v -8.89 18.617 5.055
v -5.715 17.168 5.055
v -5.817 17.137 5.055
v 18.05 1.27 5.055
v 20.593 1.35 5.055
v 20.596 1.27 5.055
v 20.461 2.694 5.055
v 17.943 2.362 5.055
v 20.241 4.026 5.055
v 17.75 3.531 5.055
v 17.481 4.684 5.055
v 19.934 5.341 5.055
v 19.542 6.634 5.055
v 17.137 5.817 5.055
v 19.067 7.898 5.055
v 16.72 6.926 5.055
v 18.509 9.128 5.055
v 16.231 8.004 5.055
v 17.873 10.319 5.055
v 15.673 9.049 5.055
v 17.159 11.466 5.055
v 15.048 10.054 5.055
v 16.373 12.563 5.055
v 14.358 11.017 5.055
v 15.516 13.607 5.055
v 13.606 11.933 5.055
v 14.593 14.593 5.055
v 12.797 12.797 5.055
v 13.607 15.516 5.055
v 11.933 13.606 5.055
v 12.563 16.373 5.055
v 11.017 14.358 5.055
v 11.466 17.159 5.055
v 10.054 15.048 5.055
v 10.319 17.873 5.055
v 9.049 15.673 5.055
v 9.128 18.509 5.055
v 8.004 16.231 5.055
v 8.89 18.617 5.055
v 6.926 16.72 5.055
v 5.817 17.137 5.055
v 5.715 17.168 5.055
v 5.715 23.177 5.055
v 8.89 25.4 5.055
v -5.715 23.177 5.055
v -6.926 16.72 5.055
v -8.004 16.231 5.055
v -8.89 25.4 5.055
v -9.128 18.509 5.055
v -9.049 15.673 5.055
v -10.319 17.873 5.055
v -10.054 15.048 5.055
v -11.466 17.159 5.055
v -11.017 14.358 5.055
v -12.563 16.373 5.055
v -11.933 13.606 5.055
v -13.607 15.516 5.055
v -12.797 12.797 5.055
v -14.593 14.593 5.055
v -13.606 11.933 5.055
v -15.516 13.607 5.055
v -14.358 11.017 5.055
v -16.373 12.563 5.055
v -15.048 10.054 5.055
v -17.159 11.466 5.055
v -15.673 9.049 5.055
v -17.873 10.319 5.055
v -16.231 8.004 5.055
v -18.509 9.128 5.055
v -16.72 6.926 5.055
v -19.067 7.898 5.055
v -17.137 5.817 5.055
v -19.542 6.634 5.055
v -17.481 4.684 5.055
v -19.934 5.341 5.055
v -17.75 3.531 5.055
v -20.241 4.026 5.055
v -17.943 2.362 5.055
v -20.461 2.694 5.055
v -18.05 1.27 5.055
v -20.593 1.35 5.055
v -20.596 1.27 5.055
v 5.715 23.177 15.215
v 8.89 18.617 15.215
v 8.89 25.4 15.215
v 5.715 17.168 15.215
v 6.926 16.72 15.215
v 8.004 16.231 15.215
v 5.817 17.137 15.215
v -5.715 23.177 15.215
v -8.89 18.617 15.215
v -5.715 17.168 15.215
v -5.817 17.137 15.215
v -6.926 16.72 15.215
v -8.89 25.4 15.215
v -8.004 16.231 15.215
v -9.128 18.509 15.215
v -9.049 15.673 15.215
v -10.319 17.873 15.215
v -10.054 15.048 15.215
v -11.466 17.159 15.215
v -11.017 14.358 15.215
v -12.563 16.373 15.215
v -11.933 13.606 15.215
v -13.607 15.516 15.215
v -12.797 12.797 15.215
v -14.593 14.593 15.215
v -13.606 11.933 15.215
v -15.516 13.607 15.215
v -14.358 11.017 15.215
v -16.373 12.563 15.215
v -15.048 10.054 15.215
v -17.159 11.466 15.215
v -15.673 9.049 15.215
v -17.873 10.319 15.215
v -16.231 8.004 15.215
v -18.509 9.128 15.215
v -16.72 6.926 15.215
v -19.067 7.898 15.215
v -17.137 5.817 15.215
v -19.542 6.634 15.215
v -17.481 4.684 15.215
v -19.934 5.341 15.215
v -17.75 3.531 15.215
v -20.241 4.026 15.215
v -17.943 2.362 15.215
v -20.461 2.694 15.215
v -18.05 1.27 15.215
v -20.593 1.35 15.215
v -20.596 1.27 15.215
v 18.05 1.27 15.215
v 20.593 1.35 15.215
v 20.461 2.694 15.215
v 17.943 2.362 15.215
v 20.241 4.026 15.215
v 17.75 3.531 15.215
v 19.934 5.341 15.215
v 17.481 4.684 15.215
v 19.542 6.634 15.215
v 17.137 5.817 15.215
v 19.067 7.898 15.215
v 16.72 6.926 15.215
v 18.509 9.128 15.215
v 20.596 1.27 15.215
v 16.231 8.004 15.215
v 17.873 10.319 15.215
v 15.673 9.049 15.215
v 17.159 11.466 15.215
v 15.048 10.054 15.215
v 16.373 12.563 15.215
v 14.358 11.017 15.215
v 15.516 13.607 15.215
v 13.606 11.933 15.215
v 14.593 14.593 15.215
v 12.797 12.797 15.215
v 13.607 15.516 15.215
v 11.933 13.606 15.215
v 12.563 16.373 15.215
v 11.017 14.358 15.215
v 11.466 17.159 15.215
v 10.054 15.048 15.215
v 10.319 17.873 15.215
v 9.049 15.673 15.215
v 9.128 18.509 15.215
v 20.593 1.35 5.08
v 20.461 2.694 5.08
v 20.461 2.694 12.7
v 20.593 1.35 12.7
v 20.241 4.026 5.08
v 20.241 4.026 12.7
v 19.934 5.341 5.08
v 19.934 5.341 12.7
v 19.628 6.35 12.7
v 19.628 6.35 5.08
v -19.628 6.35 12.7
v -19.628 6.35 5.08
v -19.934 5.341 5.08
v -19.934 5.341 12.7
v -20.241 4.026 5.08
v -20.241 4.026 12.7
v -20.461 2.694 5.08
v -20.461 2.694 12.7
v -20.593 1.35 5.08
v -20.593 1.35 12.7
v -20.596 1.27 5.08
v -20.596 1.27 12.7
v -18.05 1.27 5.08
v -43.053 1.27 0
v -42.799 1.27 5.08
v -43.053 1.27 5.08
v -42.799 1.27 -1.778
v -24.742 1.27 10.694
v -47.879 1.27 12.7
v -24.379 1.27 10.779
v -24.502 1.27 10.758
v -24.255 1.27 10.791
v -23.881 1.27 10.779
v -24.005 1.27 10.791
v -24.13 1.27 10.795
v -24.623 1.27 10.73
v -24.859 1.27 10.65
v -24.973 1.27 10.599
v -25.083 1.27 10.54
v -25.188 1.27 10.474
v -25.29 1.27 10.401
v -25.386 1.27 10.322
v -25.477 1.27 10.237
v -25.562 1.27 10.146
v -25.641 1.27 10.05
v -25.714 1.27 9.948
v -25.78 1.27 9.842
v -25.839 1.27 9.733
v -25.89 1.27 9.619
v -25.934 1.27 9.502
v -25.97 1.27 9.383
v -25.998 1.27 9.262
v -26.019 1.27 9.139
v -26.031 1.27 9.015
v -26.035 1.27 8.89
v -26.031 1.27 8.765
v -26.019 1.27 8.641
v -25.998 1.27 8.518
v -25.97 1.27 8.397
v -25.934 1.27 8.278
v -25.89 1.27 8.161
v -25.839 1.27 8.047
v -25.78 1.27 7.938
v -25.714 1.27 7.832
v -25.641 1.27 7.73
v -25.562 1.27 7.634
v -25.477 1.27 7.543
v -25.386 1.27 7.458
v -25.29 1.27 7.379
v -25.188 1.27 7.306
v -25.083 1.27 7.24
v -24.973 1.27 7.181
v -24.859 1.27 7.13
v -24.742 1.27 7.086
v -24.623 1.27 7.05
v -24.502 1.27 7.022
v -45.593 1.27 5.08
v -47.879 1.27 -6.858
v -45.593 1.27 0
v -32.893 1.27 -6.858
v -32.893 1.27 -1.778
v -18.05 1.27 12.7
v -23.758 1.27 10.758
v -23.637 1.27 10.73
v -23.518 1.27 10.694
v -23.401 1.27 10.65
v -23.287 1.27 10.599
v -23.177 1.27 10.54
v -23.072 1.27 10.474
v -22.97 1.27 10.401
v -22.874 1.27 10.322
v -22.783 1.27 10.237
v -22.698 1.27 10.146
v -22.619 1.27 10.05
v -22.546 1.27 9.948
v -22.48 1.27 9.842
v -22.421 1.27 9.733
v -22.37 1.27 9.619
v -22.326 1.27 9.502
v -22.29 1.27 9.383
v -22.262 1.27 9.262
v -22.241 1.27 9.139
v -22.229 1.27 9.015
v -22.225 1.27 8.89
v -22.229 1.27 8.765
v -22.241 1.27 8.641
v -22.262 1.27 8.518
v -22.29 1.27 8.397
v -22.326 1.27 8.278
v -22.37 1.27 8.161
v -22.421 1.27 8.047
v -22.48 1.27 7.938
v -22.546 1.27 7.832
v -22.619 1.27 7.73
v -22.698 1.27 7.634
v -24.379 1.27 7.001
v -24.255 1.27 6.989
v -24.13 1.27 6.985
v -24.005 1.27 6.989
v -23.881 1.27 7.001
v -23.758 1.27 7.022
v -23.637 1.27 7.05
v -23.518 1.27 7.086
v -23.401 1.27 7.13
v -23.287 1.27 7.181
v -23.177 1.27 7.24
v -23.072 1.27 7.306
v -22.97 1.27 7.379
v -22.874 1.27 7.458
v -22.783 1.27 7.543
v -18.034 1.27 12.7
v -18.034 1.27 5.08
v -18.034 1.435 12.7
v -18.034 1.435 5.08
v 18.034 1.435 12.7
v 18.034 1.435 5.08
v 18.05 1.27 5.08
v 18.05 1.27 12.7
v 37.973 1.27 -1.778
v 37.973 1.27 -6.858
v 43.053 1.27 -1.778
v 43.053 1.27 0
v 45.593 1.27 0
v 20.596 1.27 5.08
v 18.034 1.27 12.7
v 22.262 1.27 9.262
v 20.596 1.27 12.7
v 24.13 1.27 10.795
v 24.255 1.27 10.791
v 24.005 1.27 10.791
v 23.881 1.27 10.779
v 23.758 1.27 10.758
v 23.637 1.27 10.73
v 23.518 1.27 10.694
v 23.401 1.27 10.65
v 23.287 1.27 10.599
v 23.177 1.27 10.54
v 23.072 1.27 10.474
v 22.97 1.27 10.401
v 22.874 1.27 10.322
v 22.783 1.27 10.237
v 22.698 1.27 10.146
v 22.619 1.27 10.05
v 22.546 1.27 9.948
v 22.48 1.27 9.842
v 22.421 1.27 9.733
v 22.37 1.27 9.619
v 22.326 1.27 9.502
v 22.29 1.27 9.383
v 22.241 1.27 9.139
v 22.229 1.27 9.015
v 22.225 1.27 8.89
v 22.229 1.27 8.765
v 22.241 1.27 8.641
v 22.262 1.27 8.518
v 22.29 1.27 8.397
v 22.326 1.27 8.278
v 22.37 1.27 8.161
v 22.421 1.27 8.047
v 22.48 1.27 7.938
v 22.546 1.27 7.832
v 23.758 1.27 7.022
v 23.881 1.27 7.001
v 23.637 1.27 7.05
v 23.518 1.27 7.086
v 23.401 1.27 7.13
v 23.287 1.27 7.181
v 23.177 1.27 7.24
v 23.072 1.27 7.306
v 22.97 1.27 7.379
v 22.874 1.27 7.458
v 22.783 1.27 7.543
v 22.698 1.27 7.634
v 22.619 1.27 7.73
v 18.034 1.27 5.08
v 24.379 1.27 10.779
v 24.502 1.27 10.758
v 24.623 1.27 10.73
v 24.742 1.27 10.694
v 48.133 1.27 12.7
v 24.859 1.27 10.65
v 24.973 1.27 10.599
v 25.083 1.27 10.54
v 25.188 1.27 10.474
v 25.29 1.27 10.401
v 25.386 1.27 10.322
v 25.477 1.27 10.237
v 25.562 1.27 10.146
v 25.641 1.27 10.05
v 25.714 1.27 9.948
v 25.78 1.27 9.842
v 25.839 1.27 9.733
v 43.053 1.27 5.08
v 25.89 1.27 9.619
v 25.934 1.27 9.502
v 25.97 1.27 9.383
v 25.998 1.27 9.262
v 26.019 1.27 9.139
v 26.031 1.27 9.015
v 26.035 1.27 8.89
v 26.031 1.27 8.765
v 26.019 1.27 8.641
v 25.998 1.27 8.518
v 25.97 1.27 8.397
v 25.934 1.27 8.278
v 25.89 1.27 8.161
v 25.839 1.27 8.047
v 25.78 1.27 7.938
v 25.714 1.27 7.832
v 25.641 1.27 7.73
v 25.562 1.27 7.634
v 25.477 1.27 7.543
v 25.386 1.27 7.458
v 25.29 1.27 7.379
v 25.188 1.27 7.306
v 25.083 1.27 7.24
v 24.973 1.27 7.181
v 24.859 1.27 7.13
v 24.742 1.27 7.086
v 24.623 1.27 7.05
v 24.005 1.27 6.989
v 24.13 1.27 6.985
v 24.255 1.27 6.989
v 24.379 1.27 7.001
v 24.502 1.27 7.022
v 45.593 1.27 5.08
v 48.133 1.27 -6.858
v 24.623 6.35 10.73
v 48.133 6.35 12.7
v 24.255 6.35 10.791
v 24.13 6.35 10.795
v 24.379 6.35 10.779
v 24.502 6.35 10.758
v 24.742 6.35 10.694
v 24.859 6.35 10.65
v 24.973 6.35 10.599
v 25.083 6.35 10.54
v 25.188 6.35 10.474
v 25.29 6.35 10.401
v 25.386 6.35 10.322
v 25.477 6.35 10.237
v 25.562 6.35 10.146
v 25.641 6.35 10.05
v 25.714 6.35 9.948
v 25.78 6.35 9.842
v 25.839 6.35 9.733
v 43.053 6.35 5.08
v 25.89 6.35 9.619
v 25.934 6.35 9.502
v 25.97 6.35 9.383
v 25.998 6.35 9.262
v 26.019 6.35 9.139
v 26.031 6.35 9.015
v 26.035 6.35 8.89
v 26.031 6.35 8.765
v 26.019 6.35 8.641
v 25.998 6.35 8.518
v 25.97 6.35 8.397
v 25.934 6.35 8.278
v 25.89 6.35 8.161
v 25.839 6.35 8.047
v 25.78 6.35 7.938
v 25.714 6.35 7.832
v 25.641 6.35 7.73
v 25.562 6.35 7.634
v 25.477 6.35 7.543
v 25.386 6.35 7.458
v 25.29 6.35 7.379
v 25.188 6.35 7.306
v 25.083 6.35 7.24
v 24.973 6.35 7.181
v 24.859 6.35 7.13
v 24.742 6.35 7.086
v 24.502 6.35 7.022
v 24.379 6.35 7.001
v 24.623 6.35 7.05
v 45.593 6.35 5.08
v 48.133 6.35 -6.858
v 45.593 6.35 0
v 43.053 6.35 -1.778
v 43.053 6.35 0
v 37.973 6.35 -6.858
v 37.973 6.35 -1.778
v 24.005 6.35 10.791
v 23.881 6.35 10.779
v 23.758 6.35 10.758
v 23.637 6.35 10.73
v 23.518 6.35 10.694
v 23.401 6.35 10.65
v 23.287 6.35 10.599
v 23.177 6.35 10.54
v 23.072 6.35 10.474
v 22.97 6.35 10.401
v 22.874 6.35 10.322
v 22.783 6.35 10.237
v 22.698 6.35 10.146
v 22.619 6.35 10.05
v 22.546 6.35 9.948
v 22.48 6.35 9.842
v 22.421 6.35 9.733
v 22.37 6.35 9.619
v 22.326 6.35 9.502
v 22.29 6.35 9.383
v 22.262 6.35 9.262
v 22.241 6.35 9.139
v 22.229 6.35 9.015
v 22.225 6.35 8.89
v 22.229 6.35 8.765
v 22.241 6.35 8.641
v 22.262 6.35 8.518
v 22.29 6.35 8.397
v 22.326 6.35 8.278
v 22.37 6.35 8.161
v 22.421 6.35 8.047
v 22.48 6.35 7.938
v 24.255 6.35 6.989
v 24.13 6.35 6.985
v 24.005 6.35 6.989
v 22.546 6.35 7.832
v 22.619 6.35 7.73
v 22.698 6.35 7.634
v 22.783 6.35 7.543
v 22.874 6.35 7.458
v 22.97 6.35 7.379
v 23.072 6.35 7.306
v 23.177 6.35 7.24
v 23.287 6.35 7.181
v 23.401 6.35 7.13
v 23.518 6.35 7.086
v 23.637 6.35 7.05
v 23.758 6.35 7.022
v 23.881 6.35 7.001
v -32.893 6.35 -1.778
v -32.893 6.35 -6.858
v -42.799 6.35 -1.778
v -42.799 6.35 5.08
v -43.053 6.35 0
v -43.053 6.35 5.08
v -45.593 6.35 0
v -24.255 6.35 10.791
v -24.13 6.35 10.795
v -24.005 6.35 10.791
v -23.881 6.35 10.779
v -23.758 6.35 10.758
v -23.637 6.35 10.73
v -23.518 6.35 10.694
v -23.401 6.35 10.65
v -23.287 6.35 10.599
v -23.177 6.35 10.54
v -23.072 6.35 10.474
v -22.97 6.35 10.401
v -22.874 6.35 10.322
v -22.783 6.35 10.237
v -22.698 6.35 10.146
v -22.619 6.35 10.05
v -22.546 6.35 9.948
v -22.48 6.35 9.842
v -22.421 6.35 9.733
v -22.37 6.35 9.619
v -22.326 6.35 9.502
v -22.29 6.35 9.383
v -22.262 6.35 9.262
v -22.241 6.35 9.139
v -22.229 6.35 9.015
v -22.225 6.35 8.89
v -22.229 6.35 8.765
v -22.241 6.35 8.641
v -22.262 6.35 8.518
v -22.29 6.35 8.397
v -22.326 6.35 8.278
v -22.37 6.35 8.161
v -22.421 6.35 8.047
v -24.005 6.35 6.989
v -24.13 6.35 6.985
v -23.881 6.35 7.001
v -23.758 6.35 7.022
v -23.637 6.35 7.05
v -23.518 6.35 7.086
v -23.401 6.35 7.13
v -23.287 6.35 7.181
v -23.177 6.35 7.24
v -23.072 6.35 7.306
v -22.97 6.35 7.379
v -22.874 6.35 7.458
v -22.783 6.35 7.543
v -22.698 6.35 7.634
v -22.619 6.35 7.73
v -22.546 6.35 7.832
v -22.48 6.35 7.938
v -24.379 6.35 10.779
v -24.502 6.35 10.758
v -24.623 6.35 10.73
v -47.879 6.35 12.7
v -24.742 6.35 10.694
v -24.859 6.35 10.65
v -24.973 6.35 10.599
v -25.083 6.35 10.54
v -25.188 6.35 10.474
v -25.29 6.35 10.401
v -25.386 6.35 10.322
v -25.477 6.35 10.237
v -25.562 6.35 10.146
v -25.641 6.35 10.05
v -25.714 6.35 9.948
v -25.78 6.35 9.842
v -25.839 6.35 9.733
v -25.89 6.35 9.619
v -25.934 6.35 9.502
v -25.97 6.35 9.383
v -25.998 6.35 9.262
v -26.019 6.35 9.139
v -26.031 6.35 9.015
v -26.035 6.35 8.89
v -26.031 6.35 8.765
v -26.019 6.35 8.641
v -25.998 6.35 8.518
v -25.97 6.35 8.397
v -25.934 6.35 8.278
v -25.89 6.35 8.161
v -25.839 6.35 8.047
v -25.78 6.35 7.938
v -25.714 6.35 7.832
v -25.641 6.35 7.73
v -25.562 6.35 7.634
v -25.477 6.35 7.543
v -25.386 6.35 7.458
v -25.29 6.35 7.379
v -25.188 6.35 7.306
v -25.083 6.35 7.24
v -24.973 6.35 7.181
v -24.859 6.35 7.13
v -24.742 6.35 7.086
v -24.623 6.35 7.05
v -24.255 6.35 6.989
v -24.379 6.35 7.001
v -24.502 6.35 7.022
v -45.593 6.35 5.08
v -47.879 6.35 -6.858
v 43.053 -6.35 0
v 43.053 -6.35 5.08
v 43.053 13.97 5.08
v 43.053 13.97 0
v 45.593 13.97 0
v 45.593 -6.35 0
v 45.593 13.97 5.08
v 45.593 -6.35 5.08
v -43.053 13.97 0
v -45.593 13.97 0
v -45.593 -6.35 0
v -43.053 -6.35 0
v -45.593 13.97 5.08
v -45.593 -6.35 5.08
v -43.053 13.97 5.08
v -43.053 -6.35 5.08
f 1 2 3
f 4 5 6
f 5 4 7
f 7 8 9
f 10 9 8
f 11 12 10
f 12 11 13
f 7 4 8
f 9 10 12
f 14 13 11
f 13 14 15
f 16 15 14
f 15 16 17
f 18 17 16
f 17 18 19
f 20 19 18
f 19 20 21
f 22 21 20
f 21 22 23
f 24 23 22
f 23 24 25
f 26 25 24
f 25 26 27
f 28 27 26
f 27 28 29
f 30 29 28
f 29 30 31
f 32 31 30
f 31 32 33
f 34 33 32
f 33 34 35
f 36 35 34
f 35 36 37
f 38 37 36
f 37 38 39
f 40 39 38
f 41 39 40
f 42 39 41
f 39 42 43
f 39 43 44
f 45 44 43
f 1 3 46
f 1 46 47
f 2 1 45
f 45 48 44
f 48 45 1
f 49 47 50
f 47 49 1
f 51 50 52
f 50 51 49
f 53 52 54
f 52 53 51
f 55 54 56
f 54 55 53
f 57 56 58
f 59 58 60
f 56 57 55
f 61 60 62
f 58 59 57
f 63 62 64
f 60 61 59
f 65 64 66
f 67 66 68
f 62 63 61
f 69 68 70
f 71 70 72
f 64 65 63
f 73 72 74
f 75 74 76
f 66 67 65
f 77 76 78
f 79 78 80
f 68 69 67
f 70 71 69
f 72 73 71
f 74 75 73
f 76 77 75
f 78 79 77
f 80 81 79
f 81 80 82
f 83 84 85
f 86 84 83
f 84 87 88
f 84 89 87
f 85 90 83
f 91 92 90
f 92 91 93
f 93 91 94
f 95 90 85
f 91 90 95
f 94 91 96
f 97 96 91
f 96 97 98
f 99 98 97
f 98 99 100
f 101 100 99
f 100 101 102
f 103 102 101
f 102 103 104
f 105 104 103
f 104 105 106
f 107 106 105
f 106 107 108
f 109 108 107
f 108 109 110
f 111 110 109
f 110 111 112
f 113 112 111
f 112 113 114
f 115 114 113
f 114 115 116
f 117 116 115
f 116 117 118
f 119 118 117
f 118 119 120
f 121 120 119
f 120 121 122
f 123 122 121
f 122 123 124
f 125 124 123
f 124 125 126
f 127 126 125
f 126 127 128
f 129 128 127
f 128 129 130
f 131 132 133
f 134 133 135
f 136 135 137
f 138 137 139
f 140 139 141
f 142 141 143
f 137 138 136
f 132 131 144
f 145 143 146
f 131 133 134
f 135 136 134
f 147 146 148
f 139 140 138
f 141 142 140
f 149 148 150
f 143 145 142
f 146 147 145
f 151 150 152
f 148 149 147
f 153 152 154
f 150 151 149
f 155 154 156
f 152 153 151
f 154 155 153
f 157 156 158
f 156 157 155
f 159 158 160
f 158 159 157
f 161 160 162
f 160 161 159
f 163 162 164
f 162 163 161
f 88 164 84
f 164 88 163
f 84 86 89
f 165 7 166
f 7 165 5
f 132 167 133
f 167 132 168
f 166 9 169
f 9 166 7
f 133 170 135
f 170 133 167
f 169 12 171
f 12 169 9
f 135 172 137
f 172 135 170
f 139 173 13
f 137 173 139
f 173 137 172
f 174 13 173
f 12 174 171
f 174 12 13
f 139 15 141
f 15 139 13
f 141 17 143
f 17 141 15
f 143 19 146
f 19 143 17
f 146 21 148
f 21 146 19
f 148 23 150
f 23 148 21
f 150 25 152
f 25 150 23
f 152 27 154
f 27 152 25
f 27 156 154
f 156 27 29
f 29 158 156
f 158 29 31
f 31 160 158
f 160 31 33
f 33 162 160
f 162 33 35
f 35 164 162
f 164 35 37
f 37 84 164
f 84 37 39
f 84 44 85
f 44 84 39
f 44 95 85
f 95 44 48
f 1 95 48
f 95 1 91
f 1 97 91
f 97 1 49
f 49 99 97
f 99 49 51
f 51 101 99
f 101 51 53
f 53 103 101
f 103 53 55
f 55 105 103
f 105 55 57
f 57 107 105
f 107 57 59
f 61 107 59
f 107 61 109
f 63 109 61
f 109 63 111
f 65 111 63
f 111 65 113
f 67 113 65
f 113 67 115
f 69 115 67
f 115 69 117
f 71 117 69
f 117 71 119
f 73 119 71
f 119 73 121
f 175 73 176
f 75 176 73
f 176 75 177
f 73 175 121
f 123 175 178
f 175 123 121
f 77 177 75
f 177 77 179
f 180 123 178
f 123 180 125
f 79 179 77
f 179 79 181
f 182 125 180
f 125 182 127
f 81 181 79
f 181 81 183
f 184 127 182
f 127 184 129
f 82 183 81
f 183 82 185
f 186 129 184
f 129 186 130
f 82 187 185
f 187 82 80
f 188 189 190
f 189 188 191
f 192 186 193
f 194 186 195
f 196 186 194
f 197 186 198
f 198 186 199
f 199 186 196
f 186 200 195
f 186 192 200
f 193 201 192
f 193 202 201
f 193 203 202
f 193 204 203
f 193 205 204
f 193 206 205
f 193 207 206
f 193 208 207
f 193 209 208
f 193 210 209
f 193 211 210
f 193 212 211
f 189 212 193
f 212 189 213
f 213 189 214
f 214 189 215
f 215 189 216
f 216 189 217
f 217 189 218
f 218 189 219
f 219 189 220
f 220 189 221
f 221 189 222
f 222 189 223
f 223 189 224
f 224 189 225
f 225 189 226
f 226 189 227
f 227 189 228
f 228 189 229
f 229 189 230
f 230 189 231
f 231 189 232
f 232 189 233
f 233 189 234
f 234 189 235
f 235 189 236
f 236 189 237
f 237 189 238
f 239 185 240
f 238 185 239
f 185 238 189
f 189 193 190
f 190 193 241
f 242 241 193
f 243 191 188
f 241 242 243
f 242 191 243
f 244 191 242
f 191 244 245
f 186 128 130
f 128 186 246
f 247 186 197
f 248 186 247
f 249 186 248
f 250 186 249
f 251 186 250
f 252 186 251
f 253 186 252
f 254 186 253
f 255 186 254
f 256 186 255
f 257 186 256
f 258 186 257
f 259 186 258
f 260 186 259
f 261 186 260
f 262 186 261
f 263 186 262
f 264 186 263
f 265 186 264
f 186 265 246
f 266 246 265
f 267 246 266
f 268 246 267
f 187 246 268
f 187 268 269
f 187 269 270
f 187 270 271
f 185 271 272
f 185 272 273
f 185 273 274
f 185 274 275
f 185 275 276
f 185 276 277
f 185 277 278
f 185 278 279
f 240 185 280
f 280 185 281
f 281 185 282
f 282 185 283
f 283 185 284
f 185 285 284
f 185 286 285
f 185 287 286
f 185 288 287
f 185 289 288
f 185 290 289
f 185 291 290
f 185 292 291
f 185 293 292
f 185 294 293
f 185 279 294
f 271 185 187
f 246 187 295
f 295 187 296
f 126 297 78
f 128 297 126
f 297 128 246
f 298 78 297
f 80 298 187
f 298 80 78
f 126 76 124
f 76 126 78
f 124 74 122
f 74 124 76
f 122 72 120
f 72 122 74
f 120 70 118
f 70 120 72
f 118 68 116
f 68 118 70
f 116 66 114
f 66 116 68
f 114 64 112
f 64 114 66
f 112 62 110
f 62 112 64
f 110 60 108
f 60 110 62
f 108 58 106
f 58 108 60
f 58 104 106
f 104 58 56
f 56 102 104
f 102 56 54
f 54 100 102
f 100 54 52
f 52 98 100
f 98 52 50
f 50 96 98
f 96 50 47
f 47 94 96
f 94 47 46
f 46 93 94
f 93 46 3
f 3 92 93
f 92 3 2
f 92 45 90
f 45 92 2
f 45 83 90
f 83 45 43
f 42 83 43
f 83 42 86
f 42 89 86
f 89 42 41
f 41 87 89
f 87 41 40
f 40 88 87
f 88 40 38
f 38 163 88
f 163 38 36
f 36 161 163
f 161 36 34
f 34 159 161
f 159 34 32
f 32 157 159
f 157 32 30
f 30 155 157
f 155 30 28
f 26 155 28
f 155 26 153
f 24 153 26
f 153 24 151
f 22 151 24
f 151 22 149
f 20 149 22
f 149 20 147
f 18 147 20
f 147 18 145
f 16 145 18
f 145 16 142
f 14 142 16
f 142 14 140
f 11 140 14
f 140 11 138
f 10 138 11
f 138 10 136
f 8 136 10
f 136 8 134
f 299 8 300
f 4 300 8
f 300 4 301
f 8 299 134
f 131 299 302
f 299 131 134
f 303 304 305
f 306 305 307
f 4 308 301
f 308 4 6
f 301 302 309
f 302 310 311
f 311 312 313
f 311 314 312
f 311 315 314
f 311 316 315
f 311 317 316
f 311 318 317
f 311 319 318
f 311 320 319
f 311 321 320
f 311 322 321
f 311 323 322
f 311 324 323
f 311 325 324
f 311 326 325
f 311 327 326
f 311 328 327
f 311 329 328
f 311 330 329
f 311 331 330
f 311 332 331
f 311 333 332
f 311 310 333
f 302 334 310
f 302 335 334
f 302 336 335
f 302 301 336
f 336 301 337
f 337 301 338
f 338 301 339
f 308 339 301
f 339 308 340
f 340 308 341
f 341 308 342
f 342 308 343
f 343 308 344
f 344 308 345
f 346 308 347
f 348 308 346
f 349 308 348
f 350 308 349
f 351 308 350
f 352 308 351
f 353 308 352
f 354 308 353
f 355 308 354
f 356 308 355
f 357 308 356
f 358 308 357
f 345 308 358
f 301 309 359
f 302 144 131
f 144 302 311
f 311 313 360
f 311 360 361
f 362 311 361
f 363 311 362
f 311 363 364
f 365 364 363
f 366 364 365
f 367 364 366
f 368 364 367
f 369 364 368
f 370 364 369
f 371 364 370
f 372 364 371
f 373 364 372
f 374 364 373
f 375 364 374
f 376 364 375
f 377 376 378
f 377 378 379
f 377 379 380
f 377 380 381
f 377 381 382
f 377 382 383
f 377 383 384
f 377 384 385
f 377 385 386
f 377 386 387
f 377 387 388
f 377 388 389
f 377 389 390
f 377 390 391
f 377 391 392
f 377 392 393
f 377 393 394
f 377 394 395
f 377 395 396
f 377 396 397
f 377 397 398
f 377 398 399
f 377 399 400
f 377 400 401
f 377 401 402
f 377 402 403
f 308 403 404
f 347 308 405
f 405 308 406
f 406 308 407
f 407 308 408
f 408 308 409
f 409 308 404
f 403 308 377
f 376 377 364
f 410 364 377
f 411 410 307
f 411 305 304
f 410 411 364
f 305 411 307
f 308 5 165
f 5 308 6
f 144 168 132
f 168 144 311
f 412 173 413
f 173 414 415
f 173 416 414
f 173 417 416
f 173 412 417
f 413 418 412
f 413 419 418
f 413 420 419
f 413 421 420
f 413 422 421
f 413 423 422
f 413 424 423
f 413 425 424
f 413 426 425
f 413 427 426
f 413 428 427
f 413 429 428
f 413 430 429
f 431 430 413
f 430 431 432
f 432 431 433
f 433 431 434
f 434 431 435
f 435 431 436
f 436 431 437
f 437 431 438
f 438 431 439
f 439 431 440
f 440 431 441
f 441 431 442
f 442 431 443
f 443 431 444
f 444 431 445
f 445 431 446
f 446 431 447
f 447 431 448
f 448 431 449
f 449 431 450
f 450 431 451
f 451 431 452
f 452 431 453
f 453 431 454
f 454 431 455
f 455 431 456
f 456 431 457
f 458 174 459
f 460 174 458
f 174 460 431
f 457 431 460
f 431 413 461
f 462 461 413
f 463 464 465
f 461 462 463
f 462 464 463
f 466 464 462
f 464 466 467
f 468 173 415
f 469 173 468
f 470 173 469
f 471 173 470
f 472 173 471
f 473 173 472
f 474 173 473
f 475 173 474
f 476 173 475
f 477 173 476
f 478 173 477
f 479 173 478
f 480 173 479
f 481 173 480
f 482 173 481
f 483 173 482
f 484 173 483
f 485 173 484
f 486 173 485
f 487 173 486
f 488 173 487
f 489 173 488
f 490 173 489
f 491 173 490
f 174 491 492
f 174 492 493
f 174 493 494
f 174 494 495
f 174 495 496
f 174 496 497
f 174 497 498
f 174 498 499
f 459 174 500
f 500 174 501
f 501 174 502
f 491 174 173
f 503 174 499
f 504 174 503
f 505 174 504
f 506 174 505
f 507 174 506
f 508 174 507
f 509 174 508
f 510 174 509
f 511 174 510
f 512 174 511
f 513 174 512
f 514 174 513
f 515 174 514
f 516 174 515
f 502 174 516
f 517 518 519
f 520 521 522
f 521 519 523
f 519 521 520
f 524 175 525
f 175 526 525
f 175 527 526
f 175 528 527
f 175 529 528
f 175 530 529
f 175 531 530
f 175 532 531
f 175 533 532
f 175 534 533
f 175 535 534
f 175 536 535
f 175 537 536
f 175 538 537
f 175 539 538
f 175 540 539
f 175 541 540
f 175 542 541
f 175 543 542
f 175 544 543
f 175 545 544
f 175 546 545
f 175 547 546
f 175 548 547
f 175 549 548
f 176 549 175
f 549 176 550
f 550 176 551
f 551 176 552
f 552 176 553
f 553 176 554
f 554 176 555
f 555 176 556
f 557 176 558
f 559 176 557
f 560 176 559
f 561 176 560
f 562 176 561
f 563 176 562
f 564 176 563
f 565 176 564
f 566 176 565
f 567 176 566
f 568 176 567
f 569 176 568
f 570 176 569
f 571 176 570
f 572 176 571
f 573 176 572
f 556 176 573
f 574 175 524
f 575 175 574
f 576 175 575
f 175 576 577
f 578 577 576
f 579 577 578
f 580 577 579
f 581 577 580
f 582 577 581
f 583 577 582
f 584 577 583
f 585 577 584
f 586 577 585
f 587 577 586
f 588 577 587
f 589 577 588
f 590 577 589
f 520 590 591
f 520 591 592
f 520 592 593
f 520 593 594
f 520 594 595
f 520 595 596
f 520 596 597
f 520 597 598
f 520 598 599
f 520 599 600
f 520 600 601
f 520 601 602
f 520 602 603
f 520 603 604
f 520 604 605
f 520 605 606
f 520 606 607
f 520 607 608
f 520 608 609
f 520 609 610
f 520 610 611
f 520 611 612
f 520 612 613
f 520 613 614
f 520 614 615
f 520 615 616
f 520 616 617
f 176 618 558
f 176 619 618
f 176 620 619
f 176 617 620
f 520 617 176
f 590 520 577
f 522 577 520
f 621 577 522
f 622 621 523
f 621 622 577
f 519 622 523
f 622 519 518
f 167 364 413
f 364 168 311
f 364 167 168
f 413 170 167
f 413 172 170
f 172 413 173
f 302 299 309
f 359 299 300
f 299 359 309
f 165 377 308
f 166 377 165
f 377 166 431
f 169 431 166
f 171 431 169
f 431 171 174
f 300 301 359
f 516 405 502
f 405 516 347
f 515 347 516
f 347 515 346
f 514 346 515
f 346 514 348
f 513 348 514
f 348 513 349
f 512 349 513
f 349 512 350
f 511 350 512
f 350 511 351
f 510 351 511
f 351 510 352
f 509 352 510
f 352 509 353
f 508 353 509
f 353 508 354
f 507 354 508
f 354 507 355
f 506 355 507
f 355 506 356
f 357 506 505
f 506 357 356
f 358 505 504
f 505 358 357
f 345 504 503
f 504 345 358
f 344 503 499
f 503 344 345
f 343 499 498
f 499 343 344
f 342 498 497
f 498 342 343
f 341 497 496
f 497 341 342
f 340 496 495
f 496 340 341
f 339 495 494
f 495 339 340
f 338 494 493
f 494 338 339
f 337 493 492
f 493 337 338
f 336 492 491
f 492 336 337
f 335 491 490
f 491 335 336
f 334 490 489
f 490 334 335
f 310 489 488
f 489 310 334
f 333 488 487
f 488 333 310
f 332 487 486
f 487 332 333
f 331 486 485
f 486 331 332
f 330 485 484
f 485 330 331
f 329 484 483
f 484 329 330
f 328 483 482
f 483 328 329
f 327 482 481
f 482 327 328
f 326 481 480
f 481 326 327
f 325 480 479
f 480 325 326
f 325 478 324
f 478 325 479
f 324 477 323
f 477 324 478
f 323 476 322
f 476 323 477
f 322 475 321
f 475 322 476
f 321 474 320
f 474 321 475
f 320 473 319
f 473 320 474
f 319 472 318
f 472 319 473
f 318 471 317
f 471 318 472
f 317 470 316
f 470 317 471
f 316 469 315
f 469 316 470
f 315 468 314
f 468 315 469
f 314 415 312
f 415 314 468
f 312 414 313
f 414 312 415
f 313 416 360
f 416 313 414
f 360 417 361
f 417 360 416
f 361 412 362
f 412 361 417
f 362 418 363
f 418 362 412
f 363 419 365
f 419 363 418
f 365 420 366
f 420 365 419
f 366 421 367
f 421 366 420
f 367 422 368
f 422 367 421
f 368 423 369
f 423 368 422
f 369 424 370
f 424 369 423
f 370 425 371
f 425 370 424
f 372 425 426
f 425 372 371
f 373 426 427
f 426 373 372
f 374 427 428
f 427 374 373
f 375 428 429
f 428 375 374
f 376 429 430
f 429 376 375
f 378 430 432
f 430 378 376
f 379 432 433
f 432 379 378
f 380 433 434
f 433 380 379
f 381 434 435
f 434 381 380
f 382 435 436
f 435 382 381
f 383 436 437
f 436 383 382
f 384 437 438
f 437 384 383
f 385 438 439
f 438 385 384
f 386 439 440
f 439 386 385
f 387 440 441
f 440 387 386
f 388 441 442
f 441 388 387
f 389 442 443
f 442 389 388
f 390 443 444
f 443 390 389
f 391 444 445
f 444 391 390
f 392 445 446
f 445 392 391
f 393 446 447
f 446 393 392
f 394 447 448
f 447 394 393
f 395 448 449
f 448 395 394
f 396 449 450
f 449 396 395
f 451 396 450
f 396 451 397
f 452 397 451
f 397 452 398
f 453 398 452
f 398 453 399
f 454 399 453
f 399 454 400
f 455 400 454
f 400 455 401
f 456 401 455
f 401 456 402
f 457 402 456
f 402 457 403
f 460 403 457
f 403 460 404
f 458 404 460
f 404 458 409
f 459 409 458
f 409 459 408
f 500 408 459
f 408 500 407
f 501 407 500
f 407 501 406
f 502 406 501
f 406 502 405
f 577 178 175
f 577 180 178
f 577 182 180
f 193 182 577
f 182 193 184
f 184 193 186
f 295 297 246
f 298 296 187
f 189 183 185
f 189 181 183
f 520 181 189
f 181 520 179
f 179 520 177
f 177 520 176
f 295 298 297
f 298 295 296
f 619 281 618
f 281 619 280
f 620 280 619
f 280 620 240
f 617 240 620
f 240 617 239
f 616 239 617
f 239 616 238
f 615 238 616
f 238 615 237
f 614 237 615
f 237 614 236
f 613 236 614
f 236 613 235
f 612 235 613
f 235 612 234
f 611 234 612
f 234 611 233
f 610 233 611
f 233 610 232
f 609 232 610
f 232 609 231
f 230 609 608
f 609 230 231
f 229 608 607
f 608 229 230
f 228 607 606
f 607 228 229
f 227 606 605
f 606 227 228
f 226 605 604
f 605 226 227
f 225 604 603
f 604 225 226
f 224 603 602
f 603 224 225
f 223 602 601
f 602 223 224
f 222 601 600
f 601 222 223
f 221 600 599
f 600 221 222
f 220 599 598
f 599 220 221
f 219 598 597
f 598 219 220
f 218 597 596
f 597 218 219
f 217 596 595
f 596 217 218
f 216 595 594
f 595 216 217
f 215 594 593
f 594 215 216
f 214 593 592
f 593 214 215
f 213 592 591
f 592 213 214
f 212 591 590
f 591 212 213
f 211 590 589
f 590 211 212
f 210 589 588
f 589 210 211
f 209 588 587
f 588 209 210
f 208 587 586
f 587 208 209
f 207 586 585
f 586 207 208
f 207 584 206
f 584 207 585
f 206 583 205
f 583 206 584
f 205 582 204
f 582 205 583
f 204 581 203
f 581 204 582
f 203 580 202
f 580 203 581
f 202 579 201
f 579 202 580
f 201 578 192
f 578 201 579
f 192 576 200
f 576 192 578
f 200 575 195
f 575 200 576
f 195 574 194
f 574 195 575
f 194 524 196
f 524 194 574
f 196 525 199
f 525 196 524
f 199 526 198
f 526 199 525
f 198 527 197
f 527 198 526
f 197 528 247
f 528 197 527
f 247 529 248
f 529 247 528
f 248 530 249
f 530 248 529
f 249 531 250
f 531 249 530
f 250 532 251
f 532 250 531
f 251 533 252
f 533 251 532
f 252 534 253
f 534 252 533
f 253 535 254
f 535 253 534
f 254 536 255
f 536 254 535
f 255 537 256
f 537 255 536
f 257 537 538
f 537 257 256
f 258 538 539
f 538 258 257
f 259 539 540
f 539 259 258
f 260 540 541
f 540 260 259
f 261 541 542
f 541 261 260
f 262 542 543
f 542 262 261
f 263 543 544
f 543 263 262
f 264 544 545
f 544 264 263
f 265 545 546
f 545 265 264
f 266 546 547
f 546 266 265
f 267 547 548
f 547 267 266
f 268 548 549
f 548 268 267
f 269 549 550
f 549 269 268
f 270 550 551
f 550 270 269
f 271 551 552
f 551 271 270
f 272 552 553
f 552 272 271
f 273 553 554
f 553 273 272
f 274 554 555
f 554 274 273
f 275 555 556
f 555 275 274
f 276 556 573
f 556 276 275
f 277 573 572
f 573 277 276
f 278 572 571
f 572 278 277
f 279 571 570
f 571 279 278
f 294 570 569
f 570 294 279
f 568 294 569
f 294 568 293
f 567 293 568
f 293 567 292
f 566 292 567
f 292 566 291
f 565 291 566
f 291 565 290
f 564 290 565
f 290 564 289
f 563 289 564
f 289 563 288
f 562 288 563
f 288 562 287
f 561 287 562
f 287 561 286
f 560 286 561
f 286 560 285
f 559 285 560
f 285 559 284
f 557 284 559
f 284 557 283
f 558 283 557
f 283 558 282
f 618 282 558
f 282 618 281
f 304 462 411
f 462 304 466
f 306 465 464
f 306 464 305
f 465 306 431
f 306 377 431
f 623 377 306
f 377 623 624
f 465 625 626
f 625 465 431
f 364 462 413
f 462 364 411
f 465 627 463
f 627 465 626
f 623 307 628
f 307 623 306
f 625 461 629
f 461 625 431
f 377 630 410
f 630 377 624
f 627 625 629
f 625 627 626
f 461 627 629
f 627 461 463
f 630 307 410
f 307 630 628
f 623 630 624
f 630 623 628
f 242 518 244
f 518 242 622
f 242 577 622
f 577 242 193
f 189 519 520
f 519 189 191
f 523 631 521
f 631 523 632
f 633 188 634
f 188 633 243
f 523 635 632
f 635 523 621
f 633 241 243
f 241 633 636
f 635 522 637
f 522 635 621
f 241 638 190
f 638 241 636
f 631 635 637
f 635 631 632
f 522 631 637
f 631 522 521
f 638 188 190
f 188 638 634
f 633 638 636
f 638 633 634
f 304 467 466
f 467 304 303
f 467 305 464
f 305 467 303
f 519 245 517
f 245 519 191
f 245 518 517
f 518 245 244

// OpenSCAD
ViewScale = [0.0254, 0.0254, 0.0254];

module model_hqcam()
{
    difference() {
        circle(1210/2, $fn=96);
        circle(1060/2, $fn=96);
        //circle(1160/2, $fn=96);
        for (ii=[0:12.8:340]) {
            rotate([0, 0, ii])
            translate([1280/2, 0, 0])
            circle(60, $fn=96);
        }
    }
}

module mount0()
{
    linear_extrude(200) {
        difference() {
          circle(1490/2, $fn=96);
          circle(1230/2, $fn=96);
        }
        for (ii=[0:12.86:360]) {
            rotate([0, 0, ii])
            translate([1260/2, 0, 0])
            circle(40, $fn=96);
        }
    }
    translate([0, 0, 199])
    linear_extrude(400)
    difference() {
        circle(1625/2, $fn=96);
        circle(1425/2, $fn=96);
        translate([0, 450, 0])
        square([1700, 900], center=true);
    }

    translate([0, 0, 350])
    rotate([90, 0, 0])
    linear_extrude(200)
    for( ii = [-180,0]) {
        rotate([0, ii, 0])
        translate([950, 0, 0]) 
        difference() {
            square([400, 300], center=true);
            circle(130/2, $fn=96);
        }
    }
}

module mount1()
{
    *linear_extrude(200) {
        difference() {
          circle(1500/2, $fn=96);
          circle(1230/2, $fn=96);
        }
        for (ii=[0:12.86:360]) {
            rotate([0, 0, ii])
            translate([1260/2, 0, 0])
            circle(40, $fn=96);
        }
    }
    translate([0, 0, 199])
    linear_extrude(400)
    difference() {
        union() {
            circle(1625/2, $fn=96);
            translate([0, 750, 0])
            square([700, 500], center=true);
        }
        circle(1425/2, $fn=96);
        translate([0, -400, 0])
        square([1700, 900], center=true);

        translate([0, 1425/2-250+200, 0])
        square([450, 500], center=true);

    }

    *translate([0, -90, 200])
    square([3390, 280], center=true);

    translate([0, 250, 350])
    rotate([90, 0, 0])
    linear_extrude(200)
    for(ii = [0, 180]) {
        rotate([0, 0, ii])
        translate([950+510/2, 0, 0])
        difference() {
            square([990, 300], center=true);
            translate([-255, 0, 0])
            circle(150/2, $fn=96);
        }
    }
    *translate([-3390/2-100, -20, 200])
    linear_extrude(300)
    square([200, 540], center=true);

    // side bits
    translate([3390/2+100, -50+200, -270])
    linear_extrude(770)
    square([200, 200], center=true);

    // long side bit
    translate([3390/2+50, -50+200, 0])
    linear_extrude(200)
    square([100, 800], center=true);

    // 240 + 40 + 200 
    translate([-3390/2-90, -50+200, -270])
    linear_extrude(770)
    square([200, 200], center=true);

    // long side bit
    translate([-3390/2-50, -50+200, 0])
    linear_extrude(200)
    square([100, 800], center=true);

    //translate([-3390/2-100, -50+200, 200])
    //linear_extrude(300+240+40+200)
    //square([200, 200], center=true);

    // wraparound bits
    translate([3390/2, 240-100+10, -270])
    linear_extrude(200)
    square([400, 200], center=true);

    translate([-3390/2+200, 240-100+10, -270])
    linear_extrude(200)
    square([400, 200], center=true);
}


module model_mountto()
{
    linear_extrude(240)
    difference() {
        square([3350, 3350], center=true);
       // circle(1660/2, $fn=96);
        circle(1500/2, $fn=96);
    }
}

module forViewing()
{
 //   model_hqcam();
 color("green")
 translate([0, 0, -50])
 model_mountto();
    color("cyan")
    mount0();
    mount1();
}

module forPrinting()
{
    mount1();
}

scale(ViewScale)
{
   // forViewing();
    forPrinting();
}
